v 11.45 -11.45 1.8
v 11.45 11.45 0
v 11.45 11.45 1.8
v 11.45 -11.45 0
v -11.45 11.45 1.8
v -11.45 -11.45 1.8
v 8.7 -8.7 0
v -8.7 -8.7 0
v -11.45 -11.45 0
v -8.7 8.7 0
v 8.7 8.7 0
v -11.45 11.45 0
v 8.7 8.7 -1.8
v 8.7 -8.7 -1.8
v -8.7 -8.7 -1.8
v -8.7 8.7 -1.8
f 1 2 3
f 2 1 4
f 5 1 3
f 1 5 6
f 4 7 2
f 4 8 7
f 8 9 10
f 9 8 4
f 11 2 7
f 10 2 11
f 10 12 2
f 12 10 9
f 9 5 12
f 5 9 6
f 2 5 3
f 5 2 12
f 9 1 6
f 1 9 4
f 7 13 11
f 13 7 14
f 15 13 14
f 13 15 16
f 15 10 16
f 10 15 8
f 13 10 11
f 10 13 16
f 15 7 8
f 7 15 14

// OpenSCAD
// file: config.scad
box = 300;

// operator
operator_h = 59;    // operator max height
operator_r = 30/2;    // operator base ring radius
operator_rn =31.5/2;    // operator base ring radius with notch

module cube_rounded(v, r=3, center=false){
    translate(center==true ? [r-v[0]/2,r-v[1]/2,-v[2]/2] : [r,r,0])
    union(){
        cylinder(h = v[2], r = r);
        translate(v = [0,v[1]-2*r,0]) cylinder(h = v[2], r = r);
        translate(v = [v[0]-2*r,v[1]-2*r,0]) cylinder(h = v[2], r = r);
        translate(v = [v[0]-2*r,0,0]) cylinder(h = v[2], r = r);
        translate(v = [-r,0,0]) cube([v[0],v[1]-2*r,v[2]]);
        translate(v = [0,-r,0]) cube([v[0]-2*r,v[1],v[2]]);
    }
}
module tray_rounded(v, r=3, center=false){
    translate(center==true ? [r-v[0]/2,r-v[1]/2,v[2]/2] : [r,r,0])
    translate(v = [0,0,r]) hull(){
        cylinder(h = v[2]-r, r = r);
        sphere(r = r);
        translate(v = [0,v[1]-2*r,0]) cylinder(h = v[2]-r, r = r);
        translate(v = [0,v[1]-2*r,0]) sphere(r = r);
        translate(v = [v[0]-2*r,v[1]-2*r,0]) cylinder(h = v[2]-r, r = r);
        translate(v = [v[0]-2*r,v[1]-2*r,0]) sphere(r = r);
        translate(v = [v[0]-2*r,0,0]) cylinder(h = v[2]-r, r = r);
        translate(v = [v[0]-2*r,0,0]) sphere(r = r);
    }
}
// main file
include <config.scad>

$fn=200;

y_attacker = 130;
y_defender = box - y_attacker - 1;
w = 3.2;    // wall
b = 2;  // bottom
z = b + operator_h;
rl = 6;
c = 0.5;
or = operator_rn + c;
zl = 3.6;


module attacker() {
    difference() {
        cube_rounded(v=[box,y_attacker,z], r=rl);
        translate(v = [w,w,b+5]) cube_rounded(v=[box-2*w,y_attacker-2*w,z], r=rl-w);
        for (j = [0:1]) {
            for (i = [0:3]) {
                translate(v = [w+c+or,w+c+or,b]) translate(v = [j*2*operator_r,i*2*operator_r,0]) cylinder(h=operator_h, r=or);
            }
        }
        for (j = [0:4]) {
            for (i = [0:3]) {
                translate(v = [box/2-(4*2*operator_r)/2,w+c+or,b]) translate(v = [j*2*operator_r,i*2*operator_r,0]) cylinder(h=operator_h, r=or);
            }
        }
        for (j = [0:1]) {
            for (i = [0:3]) {
                translate(v = [box-(w+c+or)-2*operator_r,w+c+or,b]) translate(v = [j*2*operator_r,i*2*operator_r,0]) cylinder(h=operator_h, r=or);
            }
        }
    }
    attacker_grips();
}
module attacker_column() {
    for (i = [0:3]) {
        translate(v = [w+c+or+30,w+c+or,b]) translate(v = [j*2*operator_r,i*2*operator_r,0]) cylinder(h=operator_h, r=or);
    }
}
module attacker_grip(l=0) {
    hull() {
        cube([w+l,y_attacker,20]);
        translate(v = [0,(y_attacker)/2,b+operator_h+l])
        rotate(a=[0,90,0])
        cylinder(h = w+l, r = 20+l);
    }
}
module attacker_grips(l=0) {
    translate(v = [-4+w+c+or+operator_r*3.5-l/2,0,0]) attacker_grip(l);
    translate(v = [box-(-4+w+c+or+operator_r*3.5)-3-l/2,0,0]) attacker_grip(l);
}
module attacker_lid() {
    translate(v = [0,0,z])
    difference() {
        cube_rounded(v=[box,y_attacker,zl], r=rl);
        translate(v = [0,0,-z]) attacker_grips(0.5);
        for (j = [0:1]) {
            for (i = [0:3]) {
                translate(v = [w+c+or,w+c+or,zl-2]) translate(v = [j*2*operator_r,i*2*operator_r,0]) operator_token();
            }
            translate(v = [w+c+or+operator_r*2*j,w+c+or,zl-2]) translate(v = [-7.5,-10,0]) cube([15,y_attacker-20,10]);
        }
        for (j = [0:4]) {
            for (i = [0:3]) {
                translate(v = [box/2-(4*2*operator_r)/2,w+c+or,zl-2]) translate(v = [j*2*operator_r,i*2*operator_r,0]) operator_token();
            }
            translate(v = [box/2-(4*2*operator_r)/2+operator_r*2*j,w+c+or,zl-2]) translate(v = [-7.5,-10,0]) cube([15,y_attacker-20,10]);
        }
        for (j = [0:1]) {
            for (i = [0:3]) {
                translate(v = [box-(w+c+or)-2*operator_r,w+c+or,zl-2]) translate(v = [j*2*operator_r,i*2*operator_r,0]) operator_token();
            }
            translate(v = [box-(w+c+or)-operator_r*2*j,w+c+or,zl-2]) translate(v = [-7.5,-10,0]) cube([15,y_attacker-20,10]);
        }
    }
}
module operator_token() {
    t = 23.4;
    r = 3;
    translate(v = [-t/2,-t/2,0]) union() {
        cube([t,t,10]);
        translate(v = [r,r,-10]) cube([t-2*r,t-2*r,20]);
    }
}

// attacker();
// attacker_lid();

// intersection() {
//     cube([box/2,200,100]);
//     // attacker();
//     attacker_lid();
// }


module defender() {
    difference() {
        cube_rounded(v=[box,y_defender,z], r=rl);
        translate(v = [w,w,b+5]) cube_rounded(v=[box-2*w,y_attacker-2*w,z], r=rl-w);
        translate(v = [w,w,40]) cube_rounded(v=[box-2*w,y_defender-2*w,z], r=rl-w);
        for (j = [0:1]) {
            for (i = [0:3]) {
                translate(v = [w+c+or,w+c+or,b]) translate(v = [j*2*operator_r,i*2*operator_r,0]) cylinder(h=operator_h, r=or);
            }
            translate(v = [j*2*operator_r+w+or,or+y_attacker,b+30]) defender_token();
        }
        for (j = [0:4]) {
            for (i = [0:3]) {
                translate(v = [box/2-(4*2*operator_r)/2,w+c+or,b]) translate(v = [j*2*operator_r,i*2*operator_r,0]) cylinder(h=operator_h, r=or);
            }
            translate(v = [j*2*operator_r+box/2-(4*2*operator_r)/2,or+y_attacker,b+30]) defender_token();
        }
        for (j = [0:1]) {
            for (i = [0:3]) {
                translate(v = [box-(w+c+or)-2*operator_r,w+c+or,b]) translate(v = [j*2*operator_r,i*2*operator_r,0]) cylinder(h=operator_h, r=or);
            }
            translate(v = [box-(w+c+or)-2*operator_r+j*2*operator_r,or+y_attacker,b+30]) defender_token();
        }
        translate(v = [20,0,0]) 
        translate(v = [0,y_defender-25,0]) rotate(a = -45, v = [1,0,0]) cube([box/2-20,100,100]);
        translate(v = [box/2,0,0]) 
        translate(v = [0,y_defender-25,0]) rotate(a = -45, v = [1,0,0]) cube([box/2-20,100,100]);
    }
    attacker_grips();
}
module defender_token() {
    rotate(a = 90, v = [0,1,0]) hull() {
        cylinder(h = 2*10, r = (28+1)/2, center=true);
        translate(v = [-100,0,0]) cylinder(h = 2*10, r = (28+1)/2, center=true);
    }
    // cube([10*2,31,20], center=true);
}
module defender_column() {
    for (i = [0:3]) {
        translate(v = [w+c+or,w+c+or,b]) translate(v = [j*2*operator_r,i*2*operator_r,0]) cylinder(h=operator_h, r=or);
    }
}
module defender_lid() {
    translate(v = [0,0,z])
    difference() {
        cube_rounded(v=[box,y_defender,zl], r=rl);
        translate(v = [0,0,-z]) attacker_grips(0.5);
        for (j = [0:1]) {
            for (i = [0:3]) {
                translate(v = [w+c+or,w+c+or,zl-2]) translate(v = [j*2*operator_r,i*2*operator_r,0]) operator_token();
            }
            translate(v = [w+c+or+operator_r*2*j,w+c+or,zl-2]) translate(v = [-7.5,-10,0]) cube([15,y_defender-60,10]);
        }
        for (j = [0:4]) {
            for (i = [0:3]) {
                translate(v = [box/2-(4*2*operator_r)/2,w+c+or,zl-2]) translate(v = [j*2*operator_r,i*2*operator_r,0]) operator_token();
            }
            translate(v = [box/2-(4*2*operator_r)/2+operator_r*2*j,w+c+or,zl-2]) translate(v = [-7.5,-10,0]) cube([15,y_defender-60,10]);
        }
        for (j = [0:1]) {
            for (i = [0:3]) {
                translate(v = [box-(w+c+or)-2*operator_r,w+c+or,zl-2]) translate(v = [j*2*operator_r,i*2*operator_r,0]) operator_token();
            }
            translate(v = [box-(w+c+or)-operator_r*2*j,w+c+or,zl-2]) translate(v = [-7.5,-10,0]) cube([15,y_defender-60,10]);
        }
    }
}
// translate(v = [0,y_attacker,0]) defender();
// translate(v = [0,y_attacker,0]) defender_lid();

// intersection() {
//     // translate(v = [box/2,0,0])
//     cube([box/2,200,100]);
//     defender();
//     // defender_lid();
// }

module blocker() {
    z = 1.8;
    t = 23.4 - 0.5;
    r = 3;
    union() {
        translate(v = [0,0,z/2])cube([t,t,z], center=true);
        translate(v = [0,0,-z/2]) cube([t-2*r+0.5,t-2*r+0.5,z], center=true);
    }
}
blocker();
